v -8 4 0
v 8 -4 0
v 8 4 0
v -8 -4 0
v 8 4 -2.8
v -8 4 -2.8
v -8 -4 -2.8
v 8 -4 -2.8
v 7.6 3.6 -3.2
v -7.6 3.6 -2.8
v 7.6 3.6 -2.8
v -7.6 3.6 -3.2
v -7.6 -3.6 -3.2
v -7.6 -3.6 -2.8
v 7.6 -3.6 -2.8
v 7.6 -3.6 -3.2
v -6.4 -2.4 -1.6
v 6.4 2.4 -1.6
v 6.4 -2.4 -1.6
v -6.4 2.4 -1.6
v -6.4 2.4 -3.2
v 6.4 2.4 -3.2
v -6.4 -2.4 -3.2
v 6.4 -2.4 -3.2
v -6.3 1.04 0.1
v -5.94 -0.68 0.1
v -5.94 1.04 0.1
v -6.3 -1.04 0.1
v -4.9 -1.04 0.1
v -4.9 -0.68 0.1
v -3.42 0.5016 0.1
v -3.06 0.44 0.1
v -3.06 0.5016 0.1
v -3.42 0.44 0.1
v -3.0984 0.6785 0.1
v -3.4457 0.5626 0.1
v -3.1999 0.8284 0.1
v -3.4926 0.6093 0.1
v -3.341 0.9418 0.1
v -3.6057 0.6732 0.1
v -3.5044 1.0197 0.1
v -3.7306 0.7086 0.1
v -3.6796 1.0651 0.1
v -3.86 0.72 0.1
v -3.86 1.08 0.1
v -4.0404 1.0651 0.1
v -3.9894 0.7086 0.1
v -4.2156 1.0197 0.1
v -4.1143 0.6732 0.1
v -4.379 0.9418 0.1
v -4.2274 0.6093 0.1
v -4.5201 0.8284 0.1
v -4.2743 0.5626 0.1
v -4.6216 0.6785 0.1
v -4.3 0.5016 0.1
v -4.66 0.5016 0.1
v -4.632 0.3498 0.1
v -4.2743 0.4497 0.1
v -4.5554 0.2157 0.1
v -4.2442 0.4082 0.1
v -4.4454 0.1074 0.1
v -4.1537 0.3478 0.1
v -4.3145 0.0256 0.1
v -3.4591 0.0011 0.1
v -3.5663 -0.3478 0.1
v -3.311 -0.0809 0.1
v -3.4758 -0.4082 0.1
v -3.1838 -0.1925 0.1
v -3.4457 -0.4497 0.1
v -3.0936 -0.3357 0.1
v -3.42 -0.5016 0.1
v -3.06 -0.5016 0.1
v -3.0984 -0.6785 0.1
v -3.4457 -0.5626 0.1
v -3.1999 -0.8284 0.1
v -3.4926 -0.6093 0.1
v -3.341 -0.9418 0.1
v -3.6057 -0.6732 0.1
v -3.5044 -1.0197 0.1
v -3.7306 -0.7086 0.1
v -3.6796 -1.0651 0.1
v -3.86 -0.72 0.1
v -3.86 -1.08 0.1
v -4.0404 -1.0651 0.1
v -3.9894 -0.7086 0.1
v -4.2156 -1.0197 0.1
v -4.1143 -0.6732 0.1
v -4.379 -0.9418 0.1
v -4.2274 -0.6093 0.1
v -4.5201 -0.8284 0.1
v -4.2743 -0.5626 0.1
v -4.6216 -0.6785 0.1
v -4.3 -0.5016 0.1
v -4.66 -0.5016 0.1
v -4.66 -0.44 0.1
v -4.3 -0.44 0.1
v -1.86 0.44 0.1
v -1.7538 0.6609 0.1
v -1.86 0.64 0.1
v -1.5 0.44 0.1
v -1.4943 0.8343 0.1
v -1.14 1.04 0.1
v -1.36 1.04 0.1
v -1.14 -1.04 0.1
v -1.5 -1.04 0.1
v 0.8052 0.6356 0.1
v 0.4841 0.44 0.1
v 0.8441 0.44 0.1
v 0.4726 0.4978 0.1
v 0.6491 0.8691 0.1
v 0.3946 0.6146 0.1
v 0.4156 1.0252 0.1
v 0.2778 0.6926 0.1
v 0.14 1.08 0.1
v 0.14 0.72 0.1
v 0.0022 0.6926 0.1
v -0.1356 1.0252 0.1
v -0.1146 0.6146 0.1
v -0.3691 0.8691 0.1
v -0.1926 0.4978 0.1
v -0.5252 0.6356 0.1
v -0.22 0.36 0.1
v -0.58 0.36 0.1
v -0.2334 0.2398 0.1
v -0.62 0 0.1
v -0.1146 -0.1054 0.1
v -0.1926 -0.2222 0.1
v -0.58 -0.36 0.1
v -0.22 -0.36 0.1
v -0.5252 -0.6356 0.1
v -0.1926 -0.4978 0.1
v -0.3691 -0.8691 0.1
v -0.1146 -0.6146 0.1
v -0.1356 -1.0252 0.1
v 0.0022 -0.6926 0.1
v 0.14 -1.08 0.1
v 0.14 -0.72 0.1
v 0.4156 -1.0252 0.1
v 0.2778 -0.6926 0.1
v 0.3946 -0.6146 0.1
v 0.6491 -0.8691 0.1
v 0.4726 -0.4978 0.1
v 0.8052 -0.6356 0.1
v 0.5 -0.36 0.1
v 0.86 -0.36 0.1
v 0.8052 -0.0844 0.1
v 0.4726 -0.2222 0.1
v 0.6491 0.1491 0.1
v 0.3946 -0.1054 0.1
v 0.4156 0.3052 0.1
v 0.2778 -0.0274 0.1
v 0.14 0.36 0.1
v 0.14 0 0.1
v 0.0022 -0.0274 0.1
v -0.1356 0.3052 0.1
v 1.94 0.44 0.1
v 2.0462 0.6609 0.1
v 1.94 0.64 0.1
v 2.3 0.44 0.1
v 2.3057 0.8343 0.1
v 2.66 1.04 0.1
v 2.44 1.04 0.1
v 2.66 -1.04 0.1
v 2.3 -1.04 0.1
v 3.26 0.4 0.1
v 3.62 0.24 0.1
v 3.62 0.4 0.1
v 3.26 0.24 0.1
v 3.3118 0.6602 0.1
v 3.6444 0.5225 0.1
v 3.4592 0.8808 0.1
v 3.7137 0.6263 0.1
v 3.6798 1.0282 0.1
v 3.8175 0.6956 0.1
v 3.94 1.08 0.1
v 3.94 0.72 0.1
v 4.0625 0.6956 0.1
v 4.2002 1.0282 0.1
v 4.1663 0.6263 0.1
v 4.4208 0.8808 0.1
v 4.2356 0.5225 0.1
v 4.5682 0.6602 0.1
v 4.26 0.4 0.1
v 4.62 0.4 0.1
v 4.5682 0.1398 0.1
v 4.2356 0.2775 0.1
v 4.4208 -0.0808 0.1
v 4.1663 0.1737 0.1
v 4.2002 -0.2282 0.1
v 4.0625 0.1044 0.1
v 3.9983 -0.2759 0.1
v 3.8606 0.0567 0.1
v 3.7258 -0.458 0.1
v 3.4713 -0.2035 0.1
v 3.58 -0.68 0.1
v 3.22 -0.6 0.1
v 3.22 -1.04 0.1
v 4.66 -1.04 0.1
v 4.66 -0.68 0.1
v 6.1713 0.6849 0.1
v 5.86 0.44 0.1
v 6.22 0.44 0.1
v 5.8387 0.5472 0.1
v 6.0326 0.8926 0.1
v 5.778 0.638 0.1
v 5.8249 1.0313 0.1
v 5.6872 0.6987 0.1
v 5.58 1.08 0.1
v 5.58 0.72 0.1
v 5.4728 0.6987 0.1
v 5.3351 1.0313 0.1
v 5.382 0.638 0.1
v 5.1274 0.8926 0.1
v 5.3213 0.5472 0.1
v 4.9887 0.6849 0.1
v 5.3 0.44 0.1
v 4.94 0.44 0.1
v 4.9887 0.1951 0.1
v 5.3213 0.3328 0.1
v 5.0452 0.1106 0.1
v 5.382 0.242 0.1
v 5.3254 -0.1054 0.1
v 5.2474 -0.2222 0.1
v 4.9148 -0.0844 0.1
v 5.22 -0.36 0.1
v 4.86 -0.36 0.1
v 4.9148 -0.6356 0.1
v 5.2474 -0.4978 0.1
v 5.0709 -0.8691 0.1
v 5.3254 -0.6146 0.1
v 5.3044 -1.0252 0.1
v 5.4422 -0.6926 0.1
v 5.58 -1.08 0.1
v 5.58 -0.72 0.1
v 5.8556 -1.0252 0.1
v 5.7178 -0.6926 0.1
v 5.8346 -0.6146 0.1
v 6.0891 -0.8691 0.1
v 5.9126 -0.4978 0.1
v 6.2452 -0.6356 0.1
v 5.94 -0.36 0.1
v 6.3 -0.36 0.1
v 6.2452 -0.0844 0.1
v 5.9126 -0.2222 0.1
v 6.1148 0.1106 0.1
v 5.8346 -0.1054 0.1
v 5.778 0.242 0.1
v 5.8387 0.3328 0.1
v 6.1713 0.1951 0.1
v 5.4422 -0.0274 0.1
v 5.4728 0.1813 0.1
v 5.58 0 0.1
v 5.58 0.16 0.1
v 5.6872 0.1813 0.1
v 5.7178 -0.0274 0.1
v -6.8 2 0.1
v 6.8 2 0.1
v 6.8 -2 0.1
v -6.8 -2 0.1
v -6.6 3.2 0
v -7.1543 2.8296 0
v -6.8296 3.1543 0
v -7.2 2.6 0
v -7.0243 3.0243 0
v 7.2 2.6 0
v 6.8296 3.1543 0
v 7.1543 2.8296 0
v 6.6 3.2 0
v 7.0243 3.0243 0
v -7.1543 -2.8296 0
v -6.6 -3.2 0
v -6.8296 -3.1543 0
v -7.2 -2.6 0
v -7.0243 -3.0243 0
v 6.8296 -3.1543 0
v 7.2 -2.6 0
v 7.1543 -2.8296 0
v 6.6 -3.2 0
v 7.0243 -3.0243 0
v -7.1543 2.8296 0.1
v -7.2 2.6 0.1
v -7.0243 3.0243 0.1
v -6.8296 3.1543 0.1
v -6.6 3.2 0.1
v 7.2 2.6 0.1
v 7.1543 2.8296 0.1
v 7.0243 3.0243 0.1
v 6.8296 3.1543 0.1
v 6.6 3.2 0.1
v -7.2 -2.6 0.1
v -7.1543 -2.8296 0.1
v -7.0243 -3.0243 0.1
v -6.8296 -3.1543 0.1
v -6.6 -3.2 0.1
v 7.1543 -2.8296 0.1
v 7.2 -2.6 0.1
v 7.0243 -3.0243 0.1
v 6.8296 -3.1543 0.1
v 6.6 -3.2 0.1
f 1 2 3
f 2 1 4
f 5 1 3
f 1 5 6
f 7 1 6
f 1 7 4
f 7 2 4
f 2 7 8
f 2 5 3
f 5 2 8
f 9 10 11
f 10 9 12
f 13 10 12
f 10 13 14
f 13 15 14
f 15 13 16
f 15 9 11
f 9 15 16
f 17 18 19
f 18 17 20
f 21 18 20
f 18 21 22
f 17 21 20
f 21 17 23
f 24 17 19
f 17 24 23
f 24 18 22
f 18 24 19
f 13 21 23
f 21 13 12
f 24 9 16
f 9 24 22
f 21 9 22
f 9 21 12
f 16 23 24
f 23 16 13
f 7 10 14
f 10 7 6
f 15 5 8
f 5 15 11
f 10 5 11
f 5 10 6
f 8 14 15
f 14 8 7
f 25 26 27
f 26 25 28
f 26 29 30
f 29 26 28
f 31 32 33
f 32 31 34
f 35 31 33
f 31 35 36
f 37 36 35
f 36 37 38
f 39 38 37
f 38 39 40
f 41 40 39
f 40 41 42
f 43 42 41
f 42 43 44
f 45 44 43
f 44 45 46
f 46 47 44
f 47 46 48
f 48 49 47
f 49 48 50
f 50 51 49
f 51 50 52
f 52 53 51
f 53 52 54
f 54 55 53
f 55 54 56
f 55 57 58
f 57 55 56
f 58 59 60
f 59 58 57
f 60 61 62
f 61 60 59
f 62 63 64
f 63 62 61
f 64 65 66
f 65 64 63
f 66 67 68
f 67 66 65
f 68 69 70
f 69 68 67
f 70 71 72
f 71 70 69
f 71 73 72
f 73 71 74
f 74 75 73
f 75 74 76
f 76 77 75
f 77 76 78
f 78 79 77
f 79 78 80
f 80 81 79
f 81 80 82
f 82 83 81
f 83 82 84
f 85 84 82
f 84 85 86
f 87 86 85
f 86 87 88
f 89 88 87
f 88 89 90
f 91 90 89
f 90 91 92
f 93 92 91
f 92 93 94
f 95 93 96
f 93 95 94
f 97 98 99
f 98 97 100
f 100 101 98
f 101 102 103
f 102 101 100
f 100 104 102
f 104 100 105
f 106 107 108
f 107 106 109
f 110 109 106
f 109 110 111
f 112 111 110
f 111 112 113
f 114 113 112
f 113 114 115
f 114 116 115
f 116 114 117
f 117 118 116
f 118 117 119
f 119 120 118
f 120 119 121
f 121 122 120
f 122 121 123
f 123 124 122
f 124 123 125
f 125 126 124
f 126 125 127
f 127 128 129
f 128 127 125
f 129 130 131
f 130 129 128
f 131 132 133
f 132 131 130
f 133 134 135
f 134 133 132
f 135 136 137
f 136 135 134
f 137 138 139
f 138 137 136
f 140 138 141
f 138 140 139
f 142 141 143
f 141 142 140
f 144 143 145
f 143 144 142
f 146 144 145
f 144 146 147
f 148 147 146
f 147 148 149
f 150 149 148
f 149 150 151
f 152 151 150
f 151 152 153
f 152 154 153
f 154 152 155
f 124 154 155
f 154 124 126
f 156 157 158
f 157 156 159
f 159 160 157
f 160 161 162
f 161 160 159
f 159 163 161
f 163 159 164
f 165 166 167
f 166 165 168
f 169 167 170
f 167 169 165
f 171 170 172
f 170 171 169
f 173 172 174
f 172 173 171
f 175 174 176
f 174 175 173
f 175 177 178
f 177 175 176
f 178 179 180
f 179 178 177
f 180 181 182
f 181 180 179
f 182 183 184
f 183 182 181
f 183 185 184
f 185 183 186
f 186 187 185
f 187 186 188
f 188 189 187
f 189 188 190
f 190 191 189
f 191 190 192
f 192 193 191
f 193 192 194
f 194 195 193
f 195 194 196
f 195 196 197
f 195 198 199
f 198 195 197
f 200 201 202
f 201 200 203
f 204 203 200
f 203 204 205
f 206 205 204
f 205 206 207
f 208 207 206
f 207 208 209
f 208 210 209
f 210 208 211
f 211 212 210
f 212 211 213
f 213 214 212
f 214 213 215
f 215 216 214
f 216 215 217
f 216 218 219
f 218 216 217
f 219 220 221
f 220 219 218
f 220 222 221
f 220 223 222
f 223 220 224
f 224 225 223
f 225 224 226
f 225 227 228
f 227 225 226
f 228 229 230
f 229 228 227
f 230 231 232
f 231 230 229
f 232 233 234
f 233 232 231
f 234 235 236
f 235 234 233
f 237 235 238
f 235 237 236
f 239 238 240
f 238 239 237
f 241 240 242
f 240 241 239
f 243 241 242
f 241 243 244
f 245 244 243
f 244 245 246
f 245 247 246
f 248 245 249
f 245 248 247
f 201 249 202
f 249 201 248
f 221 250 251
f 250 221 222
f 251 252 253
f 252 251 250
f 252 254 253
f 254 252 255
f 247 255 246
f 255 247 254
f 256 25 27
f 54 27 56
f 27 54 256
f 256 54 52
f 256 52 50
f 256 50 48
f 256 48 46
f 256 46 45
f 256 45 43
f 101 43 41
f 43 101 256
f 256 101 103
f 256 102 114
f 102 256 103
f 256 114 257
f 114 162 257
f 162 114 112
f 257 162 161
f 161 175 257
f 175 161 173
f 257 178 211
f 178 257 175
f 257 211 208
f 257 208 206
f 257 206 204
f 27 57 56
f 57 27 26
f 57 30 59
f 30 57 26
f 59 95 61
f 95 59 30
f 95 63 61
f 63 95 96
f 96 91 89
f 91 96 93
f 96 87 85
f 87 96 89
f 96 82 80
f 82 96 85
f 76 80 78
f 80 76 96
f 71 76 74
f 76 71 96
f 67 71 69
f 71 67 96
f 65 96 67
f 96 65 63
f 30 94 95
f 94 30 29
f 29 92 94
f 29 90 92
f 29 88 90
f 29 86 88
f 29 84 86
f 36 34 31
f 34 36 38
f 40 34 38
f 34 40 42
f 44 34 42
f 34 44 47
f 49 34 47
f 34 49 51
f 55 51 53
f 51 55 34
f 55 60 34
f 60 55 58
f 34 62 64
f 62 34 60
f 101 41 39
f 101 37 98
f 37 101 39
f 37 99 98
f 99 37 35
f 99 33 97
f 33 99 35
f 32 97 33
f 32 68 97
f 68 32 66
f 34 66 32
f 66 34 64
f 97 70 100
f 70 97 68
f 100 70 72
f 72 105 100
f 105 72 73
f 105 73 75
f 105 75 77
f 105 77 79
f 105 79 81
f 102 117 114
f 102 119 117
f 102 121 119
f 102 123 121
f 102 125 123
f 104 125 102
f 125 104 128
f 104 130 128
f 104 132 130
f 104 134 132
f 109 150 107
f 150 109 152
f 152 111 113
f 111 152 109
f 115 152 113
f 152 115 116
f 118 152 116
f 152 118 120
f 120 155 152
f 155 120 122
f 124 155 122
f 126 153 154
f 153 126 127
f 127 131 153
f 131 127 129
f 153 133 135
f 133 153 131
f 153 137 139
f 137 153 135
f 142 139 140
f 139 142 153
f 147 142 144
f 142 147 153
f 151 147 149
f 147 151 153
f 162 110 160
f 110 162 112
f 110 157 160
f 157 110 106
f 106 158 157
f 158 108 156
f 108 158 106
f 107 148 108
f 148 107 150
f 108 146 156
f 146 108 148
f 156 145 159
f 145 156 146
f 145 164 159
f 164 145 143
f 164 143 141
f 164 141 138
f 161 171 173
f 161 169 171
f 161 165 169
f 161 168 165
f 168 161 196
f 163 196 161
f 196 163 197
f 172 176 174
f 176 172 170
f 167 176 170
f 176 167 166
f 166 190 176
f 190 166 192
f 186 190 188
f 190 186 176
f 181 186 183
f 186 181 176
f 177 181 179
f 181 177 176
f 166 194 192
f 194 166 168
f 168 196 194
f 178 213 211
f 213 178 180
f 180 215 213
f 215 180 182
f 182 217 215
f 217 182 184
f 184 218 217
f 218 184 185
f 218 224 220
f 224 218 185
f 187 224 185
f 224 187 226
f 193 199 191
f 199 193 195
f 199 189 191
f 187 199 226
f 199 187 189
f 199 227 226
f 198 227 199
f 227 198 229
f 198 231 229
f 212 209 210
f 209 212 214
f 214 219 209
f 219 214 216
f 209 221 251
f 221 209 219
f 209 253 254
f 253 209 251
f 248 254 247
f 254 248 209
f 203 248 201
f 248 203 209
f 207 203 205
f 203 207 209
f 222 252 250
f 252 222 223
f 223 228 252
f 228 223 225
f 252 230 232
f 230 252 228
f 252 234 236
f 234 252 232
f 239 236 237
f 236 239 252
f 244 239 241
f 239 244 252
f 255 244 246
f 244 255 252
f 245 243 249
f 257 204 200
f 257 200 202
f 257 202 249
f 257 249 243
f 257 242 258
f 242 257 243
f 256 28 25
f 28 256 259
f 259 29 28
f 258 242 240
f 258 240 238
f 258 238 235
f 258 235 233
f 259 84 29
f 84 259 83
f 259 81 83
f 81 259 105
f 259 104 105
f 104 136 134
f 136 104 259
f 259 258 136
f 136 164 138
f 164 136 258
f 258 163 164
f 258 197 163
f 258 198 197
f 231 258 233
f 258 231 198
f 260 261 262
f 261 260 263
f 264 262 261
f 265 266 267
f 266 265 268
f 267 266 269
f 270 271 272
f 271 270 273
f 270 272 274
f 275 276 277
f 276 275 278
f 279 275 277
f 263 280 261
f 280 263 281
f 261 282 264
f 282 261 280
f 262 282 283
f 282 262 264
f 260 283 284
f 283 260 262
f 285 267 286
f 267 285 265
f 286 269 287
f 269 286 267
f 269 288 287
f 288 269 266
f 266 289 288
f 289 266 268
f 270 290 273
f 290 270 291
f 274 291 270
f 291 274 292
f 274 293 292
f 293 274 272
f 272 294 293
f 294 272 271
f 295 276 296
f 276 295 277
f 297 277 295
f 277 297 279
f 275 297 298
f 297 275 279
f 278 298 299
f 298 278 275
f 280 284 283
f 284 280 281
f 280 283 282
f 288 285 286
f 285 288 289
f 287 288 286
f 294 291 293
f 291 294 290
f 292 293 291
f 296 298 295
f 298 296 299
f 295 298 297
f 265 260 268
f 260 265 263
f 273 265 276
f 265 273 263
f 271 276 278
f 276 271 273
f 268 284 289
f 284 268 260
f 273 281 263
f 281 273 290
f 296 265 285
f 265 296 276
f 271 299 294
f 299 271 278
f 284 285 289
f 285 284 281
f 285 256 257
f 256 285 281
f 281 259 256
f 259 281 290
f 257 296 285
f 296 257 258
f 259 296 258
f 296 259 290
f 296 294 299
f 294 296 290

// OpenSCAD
use <../lib.scad>
use <3069b.scad>
use <6141875b.scad>
function ldraw_lib__3069bd2p() = [
// 0 Tile  1 x  2 with Black License Plate "LS 16 128" on White Background Sticker
// 0 Name: 3069bd2p.dat
// 0 Author: Alfred Schmitz [AlfredS]
// 0 !LDRAW_ORG Shortcut UPDATE 2026-08
// 0 !LICENSE Licensed under CC BY 4.0 : see CAreadme.txt
// 
// 0 BFC CERTIFY CCW
  [0,"BFC","CERTIFY"],
  [0,"BFC","CCW"],
// 
// 0 !CATEGORY Sticker Shortcut
// 0 !KEYWORDS F-150, Ford, Raptor, Set 75875, Speed Champions
// 
// 0 !HISTORY 2026-08-31 [OrionP] Official Update 2026-08
// 
// 1 16 0 0 0 1 0 0 0 1 0 0 0 1 3069b.dat
  [1,16,0,0,0,1,0,0,0,1,0,0,0,1, ldraw_lib__3069b()],
// 1 16 0 0 0 1 0 0 0 1 0 0 0 1 6141875b.dat
  [1,16,0,0,0,1,0,0,0,1,0,0,0,1, ldraw_lib__6141875b()],
];
module ldraw_lib__3069bd2p(step=0, col=false, unit=2/5, alt=false, line=0.2, solid=!$preview)
    makepoly(ldraw_lib__3069bd2p(), step=step, col=col, unit=unit, alt=alt, line=line, solid=solid);
ldraw_lib__3069bd2p(line=0.2);
